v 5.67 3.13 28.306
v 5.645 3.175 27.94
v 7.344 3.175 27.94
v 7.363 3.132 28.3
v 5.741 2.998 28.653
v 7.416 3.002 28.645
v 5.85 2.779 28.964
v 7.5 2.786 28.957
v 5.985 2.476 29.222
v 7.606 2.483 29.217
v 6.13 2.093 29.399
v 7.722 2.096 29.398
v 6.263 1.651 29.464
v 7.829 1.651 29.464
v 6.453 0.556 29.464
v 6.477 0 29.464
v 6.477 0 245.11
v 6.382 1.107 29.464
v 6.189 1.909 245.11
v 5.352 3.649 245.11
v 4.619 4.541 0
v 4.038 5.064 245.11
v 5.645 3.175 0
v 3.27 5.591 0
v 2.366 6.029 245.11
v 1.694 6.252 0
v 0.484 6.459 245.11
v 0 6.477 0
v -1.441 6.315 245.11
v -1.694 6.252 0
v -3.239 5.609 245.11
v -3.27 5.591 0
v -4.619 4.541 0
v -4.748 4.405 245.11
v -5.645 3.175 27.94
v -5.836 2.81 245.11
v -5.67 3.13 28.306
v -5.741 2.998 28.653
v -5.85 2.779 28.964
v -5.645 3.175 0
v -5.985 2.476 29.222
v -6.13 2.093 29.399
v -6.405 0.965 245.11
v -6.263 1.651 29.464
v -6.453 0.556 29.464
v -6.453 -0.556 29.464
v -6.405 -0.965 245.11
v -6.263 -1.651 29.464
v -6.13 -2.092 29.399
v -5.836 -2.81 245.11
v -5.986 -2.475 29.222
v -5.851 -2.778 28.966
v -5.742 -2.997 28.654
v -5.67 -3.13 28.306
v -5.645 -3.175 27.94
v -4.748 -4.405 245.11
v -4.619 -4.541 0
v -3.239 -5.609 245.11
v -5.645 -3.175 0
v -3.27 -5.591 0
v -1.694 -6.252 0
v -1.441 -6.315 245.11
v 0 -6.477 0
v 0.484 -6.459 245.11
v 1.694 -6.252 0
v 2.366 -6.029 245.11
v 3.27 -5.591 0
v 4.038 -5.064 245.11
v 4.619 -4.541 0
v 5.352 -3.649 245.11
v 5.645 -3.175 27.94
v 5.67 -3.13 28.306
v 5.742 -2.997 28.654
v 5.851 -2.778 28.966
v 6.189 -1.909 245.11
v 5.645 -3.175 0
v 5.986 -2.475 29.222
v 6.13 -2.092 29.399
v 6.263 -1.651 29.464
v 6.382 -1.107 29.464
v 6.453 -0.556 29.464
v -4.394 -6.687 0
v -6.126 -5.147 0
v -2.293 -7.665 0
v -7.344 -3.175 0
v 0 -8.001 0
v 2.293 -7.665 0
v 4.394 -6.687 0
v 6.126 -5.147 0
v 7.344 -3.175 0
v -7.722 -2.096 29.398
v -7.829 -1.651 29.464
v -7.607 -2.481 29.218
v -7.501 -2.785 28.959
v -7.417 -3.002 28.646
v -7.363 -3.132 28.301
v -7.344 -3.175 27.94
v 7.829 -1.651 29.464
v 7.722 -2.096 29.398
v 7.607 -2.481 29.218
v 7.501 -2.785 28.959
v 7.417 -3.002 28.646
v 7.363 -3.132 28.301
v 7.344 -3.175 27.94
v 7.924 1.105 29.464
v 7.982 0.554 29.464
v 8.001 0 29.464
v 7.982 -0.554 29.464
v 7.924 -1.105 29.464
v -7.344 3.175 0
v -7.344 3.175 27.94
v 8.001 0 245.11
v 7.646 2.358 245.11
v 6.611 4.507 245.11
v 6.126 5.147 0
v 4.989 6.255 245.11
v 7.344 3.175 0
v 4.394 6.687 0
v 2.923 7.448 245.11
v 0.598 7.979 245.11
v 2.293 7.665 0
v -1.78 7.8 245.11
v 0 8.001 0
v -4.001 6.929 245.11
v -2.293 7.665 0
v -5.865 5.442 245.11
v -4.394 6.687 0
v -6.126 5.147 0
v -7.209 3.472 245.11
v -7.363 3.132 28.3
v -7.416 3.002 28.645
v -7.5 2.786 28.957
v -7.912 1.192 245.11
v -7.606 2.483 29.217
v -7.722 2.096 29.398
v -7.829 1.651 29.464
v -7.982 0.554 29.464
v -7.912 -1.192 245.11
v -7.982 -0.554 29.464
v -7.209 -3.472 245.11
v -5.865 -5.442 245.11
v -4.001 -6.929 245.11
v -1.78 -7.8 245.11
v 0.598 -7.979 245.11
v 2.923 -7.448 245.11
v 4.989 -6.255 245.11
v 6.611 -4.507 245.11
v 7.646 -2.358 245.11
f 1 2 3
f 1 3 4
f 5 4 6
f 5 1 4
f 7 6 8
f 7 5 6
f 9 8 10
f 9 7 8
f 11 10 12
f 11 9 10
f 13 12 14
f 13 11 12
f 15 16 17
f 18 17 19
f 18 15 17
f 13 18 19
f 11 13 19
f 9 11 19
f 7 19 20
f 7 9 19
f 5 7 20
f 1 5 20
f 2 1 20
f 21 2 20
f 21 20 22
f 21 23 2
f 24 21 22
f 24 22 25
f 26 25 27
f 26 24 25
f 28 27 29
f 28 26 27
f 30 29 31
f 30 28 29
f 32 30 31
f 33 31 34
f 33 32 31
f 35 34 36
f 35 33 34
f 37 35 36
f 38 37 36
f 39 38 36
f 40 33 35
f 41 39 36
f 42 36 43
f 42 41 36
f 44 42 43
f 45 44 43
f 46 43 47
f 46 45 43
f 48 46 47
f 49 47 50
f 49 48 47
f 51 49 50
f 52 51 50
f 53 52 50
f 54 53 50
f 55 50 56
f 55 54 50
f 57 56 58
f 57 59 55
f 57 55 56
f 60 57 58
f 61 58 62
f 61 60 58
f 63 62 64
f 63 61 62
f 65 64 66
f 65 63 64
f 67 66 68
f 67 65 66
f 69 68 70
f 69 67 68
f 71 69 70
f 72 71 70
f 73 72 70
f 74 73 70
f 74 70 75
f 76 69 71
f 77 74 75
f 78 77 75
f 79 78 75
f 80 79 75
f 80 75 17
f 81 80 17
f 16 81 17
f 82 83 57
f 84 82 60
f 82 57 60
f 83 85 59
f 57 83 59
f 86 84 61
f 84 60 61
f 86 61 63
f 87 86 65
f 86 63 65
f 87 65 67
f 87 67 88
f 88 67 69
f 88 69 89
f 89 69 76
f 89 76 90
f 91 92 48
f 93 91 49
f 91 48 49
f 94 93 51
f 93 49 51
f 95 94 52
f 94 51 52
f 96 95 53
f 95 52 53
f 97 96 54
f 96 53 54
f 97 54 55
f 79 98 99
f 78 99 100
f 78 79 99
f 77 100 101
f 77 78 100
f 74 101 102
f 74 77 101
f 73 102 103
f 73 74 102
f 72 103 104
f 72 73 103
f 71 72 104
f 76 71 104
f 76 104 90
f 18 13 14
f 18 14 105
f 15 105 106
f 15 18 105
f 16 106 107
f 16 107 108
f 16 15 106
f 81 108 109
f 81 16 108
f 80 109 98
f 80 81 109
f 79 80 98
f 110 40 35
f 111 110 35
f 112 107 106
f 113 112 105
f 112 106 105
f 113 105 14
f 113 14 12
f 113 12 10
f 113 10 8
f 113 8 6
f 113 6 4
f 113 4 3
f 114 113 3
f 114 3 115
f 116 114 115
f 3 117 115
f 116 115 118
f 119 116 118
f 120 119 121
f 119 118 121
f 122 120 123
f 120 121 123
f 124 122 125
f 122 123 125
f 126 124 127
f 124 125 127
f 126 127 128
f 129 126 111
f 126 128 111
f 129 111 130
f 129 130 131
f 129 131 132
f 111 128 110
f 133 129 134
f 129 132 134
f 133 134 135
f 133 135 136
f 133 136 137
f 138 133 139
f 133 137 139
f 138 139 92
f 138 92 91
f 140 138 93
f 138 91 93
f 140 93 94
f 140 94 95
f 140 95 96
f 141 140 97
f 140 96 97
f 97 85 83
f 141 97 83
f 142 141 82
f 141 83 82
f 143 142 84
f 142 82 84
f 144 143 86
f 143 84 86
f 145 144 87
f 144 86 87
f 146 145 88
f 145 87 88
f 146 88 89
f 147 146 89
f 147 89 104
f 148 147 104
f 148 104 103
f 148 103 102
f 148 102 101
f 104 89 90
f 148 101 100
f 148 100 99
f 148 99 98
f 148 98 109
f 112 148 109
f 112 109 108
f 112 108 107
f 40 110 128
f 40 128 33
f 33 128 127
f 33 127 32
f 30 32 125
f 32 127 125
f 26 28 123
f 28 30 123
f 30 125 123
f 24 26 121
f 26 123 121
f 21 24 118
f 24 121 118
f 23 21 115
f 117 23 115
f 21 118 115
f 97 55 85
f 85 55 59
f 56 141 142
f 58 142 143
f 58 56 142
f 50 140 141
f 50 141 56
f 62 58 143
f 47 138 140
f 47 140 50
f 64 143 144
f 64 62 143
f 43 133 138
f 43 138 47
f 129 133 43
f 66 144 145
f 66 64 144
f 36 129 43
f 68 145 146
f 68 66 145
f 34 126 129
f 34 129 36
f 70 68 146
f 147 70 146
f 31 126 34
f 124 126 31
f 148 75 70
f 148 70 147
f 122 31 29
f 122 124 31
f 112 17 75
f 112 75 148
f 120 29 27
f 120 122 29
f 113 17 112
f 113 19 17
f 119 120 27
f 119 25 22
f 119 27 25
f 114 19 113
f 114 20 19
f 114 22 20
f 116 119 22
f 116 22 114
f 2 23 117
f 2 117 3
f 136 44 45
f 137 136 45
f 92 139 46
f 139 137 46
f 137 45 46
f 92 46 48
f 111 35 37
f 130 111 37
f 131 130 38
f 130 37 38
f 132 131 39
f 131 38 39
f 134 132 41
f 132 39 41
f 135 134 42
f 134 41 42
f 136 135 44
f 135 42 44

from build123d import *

# Parameters (mm, degrees)
SKETCH1_R               = 8.001
SKETCH1_R_2             = 6.477
BOSS_EXTRUDE1_DEPTH     = 245.11
CUT_EXTRUDE1_DEPTH      = 9.001
CUT_EXTRUDE1_DEPTH_BACK = 9.001


with BuildPart() as part:
    # Sketch1 → Boss-Extrude1 (new body)
    with BuildSketch(Plane.XY):
        Circle(SKETCH1_R)
        Circle(SKETCH1_R_2, mode=Mode.SUBTRACT)
    extrude(amount=BOSS_EXTRUDE1_DEPTH)

    # Sketch2 → Cut-Extrude1 (cut, two sides)
    with BuildSketch(Plane(origin=(0, 0, 0), x_dir=(0, 0, -1), z_dir=(1, 0, 0))) as cut_extrude1_sk:
        with BuildLine():
            Line((500.729314698, 3.175), (0, 3.175))
            Line((0, 3.175), (-27.94, 3.175))
            ThreePointArc((-27.94, 3.175), (-29.017630735, 2.728630735), (-29.464, 1.651))
            Line((-29.464, 1.651), (-29.464, -1.651))
            ThreePointArc((-29.464, -1.651), (-29.017630735, -2.728630735), (-27.94, -3.175))
            Line((-27.94, -3.175), (0, -3.175))
            Line((0, -3.175), (500.729314698, -3.175))
            Line((500.729314698, -3.175), (1502.187944094, -3.175))
            Line((1502.187944094, -3.175), (1502.187944094, 3.175))
            Line((1502.187944094, 3.175), (500.729314698, 3.175))
        make_face()
    extrude(amount=CUT_EXTRUDE1_DEPTH, mode=Mode.SUBTRACT)
    extrude(cut_extrude1_sk.sketch, amount=-CUT_EXTRUDE1_DEPTH_BACK, mode=Mode.SUBTRACT)


solid = part.part
